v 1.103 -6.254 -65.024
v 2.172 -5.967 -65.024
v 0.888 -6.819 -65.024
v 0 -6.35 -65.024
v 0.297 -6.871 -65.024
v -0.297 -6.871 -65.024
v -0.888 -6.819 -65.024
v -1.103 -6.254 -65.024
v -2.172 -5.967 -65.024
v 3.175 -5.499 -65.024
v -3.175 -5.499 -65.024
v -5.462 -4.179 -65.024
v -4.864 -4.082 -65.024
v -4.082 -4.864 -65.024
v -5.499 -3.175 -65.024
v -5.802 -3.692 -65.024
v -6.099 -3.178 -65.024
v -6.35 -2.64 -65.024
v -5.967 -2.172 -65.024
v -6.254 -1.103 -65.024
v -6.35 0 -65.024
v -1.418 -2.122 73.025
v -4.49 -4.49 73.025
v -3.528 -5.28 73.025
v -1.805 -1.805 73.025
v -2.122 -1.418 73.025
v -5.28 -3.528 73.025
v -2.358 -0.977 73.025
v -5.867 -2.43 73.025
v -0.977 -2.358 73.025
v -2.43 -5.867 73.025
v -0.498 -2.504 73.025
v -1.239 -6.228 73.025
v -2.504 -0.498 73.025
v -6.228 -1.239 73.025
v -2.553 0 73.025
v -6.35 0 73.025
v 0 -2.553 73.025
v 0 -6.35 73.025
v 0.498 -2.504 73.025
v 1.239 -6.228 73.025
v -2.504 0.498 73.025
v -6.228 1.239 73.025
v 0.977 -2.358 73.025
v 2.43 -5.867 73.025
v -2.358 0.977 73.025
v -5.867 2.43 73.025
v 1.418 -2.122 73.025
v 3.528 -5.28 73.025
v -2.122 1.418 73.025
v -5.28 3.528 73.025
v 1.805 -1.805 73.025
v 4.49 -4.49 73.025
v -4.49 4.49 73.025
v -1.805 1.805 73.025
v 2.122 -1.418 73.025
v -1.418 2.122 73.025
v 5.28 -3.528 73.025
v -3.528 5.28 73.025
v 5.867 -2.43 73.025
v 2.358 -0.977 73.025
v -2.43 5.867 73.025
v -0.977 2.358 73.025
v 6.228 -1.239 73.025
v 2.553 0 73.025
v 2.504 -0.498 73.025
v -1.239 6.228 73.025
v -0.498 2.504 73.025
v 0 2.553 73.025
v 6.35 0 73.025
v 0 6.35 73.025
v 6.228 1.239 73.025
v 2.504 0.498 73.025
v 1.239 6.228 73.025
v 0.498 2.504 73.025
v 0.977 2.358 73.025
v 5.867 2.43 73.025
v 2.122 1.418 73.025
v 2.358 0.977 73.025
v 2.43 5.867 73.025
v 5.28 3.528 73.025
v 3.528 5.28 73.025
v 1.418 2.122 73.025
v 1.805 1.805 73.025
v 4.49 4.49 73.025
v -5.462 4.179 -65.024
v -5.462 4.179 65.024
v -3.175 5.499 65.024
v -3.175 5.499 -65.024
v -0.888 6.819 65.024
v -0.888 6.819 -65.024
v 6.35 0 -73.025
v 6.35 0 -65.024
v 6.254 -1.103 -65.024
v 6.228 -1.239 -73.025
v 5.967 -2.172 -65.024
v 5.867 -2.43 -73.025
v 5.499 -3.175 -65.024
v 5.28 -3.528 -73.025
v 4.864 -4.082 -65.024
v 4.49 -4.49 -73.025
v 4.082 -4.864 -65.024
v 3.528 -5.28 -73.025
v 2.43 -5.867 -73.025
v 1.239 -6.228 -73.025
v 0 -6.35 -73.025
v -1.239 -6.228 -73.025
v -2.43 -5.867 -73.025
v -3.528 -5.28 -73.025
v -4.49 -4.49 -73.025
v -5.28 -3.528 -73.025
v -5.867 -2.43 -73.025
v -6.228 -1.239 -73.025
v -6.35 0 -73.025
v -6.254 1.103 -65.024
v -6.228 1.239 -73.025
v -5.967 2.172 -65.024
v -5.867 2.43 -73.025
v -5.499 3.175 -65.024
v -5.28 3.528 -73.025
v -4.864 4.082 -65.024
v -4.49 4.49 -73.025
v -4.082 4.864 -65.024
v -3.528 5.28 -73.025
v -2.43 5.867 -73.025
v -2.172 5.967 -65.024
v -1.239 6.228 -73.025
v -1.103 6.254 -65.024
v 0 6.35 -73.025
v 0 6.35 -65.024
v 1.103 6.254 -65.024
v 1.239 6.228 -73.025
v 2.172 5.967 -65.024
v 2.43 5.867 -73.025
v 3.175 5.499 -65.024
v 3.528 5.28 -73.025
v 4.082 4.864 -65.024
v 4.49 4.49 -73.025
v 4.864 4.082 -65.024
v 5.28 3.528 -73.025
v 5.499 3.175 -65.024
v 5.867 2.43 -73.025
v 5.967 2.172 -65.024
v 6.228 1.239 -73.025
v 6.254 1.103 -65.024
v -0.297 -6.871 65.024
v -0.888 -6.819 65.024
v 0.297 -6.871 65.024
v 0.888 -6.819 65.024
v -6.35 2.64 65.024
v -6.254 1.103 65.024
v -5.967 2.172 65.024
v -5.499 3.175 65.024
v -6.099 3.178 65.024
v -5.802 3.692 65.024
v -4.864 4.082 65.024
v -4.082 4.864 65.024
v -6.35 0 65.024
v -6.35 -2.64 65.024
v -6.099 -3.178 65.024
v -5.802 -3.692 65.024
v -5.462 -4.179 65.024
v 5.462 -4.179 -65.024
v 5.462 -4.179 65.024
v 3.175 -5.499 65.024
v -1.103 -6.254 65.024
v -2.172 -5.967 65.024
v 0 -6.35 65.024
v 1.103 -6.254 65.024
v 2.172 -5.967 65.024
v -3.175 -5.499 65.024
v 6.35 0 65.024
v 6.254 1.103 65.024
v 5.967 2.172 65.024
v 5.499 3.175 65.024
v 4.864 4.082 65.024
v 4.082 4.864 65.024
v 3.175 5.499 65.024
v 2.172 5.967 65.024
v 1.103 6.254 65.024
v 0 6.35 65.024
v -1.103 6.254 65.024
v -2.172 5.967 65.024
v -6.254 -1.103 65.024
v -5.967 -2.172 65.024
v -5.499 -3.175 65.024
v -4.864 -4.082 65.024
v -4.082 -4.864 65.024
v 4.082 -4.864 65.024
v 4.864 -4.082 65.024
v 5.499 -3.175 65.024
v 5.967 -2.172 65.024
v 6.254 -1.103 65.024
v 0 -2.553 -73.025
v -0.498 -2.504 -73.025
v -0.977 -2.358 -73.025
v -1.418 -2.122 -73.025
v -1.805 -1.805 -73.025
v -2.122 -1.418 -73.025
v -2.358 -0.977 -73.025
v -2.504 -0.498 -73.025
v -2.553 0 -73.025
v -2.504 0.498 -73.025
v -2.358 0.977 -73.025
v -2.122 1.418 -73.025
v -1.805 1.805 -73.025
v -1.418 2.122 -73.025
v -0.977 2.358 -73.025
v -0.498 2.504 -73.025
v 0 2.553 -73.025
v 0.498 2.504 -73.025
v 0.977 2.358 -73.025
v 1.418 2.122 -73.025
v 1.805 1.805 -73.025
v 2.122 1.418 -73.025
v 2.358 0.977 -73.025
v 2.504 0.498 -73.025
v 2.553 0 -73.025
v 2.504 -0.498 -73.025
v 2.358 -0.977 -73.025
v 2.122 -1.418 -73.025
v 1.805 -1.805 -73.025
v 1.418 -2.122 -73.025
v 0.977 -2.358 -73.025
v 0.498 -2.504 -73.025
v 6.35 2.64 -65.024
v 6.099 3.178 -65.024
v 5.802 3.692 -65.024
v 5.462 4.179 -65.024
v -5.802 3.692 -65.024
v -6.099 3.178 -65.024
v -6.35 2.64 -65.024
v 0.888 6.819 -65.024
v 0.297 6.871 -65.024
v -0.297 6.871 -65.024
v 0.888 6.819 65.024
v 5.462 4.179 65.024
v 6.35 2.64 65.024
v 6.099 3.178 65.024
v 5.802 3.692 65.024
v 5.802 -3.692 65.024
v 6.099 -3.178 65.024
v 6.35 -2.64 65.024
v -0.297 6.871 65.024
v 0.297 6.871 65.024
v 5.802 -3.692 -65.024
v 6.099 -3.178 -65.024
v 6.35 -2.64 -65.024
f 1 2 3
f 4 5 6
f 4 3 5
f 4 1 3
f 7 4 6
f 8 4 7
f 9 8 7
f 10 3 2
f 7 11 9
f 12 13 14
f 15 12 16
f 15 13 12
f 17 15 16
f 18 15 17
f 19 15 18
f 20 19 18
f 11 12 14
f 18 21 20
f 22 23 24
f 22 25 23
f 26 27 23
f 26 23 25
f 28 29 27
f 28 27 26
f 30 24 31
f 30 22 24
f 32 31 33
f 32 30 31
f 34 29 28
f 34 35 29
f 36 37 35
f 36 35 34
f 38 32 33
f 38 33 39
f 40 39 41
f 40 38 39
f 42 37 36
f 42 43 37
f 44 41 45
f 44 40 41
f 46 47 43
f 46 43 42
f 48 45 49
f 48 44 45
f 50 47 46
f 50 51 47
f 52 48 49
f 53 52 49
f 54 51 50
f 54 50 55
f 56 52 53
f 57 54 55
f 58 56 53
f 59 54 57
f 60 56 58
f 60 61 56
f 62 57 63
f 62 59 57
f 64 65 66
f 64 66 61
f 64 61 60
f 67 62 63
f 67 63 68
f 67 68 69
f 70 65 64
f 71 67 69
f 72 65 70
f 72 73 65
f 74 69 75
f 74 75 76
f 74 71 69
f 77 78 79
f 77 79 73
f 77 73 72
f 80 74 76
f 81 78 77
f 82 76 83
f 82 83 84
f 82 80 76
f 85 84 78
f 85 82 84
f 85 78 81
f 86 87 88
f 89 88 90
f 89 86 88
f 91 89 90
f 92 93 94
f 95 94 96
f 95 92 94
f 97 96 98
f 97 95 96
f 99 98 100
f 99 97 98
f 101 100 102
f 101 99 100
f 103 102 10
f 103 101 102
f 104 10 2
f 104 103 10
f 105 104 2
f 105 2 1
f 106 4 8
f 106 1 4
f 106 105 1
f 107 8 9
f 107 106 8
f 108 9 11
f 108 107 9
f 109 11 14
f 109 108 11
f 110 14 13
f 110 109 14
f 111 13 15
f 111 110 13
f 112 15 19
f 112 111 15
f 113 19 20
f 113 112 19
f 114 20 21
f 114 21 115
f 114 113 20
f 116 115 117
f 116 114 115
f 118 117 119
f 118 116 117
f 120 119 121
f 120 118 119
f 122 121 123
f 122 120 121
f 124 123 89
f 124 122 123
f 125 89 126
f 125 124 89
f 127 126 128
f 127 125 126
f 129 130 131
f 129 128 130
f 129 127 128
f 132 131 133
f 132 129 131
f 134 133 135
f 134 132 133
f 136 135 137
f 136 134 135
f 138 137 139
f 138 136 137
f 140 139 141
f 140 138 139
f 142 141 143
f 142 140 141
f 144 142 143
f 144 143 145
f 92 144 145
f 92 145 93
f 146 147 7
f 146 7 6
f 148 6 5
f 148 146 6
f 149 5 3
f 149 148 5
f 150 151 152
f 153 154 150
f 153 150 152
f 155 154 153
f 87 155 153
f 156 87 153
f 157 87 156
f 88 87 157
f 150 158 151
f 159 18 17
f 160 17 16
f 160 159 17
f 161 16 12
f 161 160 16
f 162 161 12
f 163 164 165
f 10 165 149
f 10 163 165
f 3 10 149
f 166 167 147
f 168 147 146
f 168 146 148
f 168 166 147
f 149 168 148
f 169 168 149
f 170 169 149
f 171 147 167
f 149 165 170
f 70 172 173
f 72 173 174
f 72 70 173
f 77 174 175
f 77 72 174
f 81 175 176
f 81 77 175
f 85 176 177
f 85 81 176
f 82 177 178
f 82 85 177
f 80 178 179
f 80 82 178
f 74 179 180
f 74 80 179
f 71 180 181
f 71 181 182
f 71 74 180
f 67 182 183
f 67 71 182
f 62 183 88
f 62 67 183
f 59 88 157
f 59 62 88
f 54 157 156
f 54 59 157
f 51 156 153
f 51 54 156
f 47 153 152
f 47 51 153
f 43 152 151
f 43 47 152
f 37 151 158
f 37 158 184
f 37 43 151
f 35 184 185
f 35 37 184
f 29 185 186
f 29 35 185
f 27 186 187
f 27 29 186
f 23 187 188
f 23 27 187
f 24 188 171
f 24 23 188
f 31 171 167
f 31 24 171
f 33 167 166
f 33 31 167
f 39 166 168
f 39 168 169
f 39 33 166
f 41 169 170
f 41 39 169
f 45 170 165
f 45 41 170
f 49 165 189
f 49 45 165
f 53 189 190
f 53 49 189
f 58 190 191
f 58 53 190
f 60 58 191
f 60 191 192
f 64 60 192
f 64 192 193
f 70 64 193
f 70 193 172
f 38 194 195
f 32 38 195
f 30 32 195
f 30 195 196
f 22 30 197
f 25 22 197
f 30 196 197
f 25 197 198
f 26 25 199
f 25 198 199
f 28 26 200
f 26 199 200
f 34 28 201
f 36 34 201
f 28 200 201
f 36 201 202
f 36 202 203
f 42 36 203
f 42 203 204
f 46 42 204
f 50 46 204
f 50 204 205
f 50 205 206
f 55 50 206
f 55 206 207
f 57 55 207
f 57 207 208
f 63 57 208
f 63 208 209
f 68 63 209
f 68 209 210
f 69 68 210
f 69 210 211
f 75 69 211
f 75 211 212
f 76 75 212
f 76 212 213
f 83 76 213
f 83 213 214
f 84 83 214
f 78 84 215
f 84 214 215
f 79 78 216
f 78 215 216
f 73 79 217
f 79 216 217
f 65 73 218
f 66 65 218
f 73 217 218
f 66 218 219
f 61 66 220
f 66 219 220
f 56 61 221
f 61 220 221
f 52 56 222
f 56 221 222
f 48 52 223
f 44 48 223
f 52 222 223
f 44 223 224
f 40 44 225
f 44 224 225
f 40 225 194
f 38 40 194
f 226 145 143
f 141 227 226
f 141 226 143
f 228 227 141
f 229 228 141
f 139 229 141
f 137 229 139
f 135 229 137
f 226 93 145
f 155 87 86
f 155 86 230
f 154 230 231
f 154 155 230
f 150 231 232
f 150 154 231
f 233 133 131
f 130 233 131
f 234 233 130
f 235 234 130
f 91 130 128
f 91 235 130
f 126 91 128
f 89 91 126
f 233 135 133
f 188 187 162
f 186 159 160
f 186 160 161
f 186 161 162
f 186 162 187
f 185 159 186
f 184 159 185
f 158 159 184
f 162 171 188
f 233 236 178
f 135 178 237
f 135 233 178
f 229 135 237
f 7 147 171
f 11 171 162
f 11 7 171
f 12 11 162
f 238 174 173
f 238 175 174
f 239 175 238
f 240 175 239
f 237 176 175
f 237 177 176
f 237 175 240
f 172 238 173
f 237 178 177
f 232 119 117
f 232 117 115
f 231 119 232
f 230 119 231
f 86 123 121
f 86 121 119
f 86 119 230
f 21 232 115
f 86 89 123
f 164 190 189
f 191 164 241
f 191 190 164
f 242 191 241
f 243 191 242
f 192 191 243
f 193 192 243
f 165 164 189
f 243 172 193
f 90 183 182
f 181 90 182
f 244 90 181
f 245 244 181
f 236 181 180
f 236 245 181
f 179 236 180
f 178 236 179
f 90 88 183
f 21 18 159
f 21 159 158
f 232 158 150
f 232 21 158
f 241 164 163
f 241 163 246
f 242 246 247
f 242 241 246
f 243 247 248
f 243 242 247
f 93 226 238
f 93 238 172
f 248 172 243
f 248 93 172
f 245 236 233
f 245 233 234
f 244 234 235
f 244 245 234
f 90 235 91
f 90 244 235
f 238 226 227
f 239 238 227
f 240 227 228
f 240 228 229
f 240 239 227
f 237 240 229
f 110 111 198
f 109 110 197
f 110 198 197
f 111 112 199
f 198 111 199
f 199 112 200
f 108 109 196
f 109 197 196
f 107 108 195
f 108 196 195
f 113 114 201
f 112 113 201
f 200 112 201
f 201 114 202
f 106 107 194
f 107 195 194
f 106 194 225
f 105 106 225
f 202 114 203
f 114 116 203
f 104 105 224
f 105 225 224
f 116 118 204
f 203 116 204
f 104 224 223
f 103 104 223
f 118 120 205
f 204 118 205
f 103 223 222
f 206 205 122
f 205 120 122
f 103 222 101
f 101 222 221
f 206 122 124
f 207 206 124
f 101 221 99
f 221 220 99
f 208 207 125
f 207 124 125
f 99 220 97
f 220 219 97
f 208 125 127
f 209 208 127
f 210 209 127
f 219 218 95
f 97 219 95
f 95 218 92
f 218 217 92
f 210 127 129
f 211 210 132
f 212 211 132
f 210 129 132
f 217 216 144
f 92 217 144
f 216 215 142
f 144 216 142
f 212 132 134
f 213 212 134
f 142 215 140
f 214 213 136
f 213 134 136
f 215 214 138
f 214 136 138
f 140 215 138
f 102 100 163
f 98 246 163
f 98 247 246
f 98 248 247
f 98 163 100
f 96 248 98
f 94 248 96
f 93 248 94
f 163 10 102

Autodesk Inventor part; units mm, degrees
ref_plane "YZ Plane" through (0, 0, 0) normal (1, 0, 0) x (0, 1, 0)
ref_plane "XZ Plane" through (0, 0, 0) normal (0, 1, 0) x (-1, 0, 0)
ref_plane "XY Plane" through (0, 0, 0) normal (0, 0, 1) x (1, 0, 0)
sketch "Sketch1" plane through (0, 0, 0) normal (0, 0, 1) x (1, 0, 0)
  line L0 (-6.35, -3.6662) -> (-6.35, 3.6662)
  line L1 (-6.35, 3.6662) -> (0, 7.3323)
  line L2 (0, 7.3323) -> (6.35, 3.6662)
  line L3 (6.35, 3.6662) -> (6.35, -3.6662)
  line L4 (6.35, -3.6662) -> (0, -7.3323)
  line L5 (0, -7.3323) -> (-6.35, -3.6662)
  point P0 (0, 0)
  point P1 (0, 0)
  dimension "Size" = 12.7
extrude "Extrusion1" add sketch "Sketch1" along normal mid plane 146.05
sketch "Sketch3" plane through (0, 0, 73.025) normal (0, 0, 1) x (1, 0, 0)
  line L0 (-6.35, 3.6662) -> (0, 7.3323) construction
  line L1 (0, 7.3323) -> (6.35, 3.6662) construction
  line L2 (6.35, 3.6662) -> (6.35, -3.6662) construction
  line L3 (6.35, -3.6662) -> (0, -7.3323) construction
  line L4 (0, -7.3323) -> (-6.35, -3.6662) construction
  line L5 (-6.35, -3.6662) -> (-6.35, 3.6662) construction
  point P0 (0, 0)
hole "Hole1" at (0, 0, 73.025) direction (0, 0, -1) diameter 5.1054 end through all
sketch "Sketch4" plane through (0, 0, 73.025) normal (0, 0, 1) x (1, 0, 0)
  circle A0 centre (0, 0) radius 2.5527 construction
  line L0 (-6.35, 3.6662) -> (0, 7.3323) construction
  line L1 (0, 7.3323) -> (6.35, 3.6662) construction
  line L2 (6.35, 3.6662) -> (6.35, -3.6662) construction
  line L3 (6.35, -3.6662) -> (0, -7.3323) construction
  line L4 (0, -7.3323) -> (-6.35, -3.6662) construction
  line L5 (-6.35, -3.6662) -> (-6.35, 3.6662) construction
  circle A1 centre (0, 0) radius 6.8771
  circle A2 centre (0, 0) radius 8.89
  dimension "thunder" = 13.7541
  dimension "d16" = 17.78
extrude "Extrusion3" cut sketch "Sketch4" against normal through all
sketch "Sketch5" plane through (0, 0, 73.025) normal (0, 0, 1) x (1, 0, 0)
  arc A0 (5.4616, -4.1791) -> (6.35, -2.6403) centre (0, 0) ccw projected
  line L0 (5.4616, -4.1791) -> (0.8884, -6.8194) projected
  arc A1 (-0.8884, -6.8194) -> (0.8884, -6.8194) centre (0, 0) ccw projected
  line L1 (-0.8884, -6.8194) -> (-5.4616, -4.1791) projected
  arc A2 (-6.35, -2.6403) -> (-5.4616, -4.1791) centre (0, 0) ccw projected
  line L2 (-6.35, -2.6403) -> (-6.35, 2.6403) projected
  arc A3 (-5.4616, 4.1791) -> (-6.35, 2.6403) centre (0, 0) ccw projected
  line L3 (-5.4616, 4.1791) -> (-0.8884, 6.8194) projected
  arc A4 (0.8884, 6.8194) -> (-0.8884, 6.8194) centre (0, 0) ccw projected
  line L4 (0.8884, 6.8194) -> (5.4616, 4.1791) projected
  arc A5 (6.35, 2.6403) -> (5.4616, 4.1791) centre (0, 0) ccw projected
  line L5 (6.35, 2.6403) -> (6.35, -2.6403) projected
  circle A6 centre (0, 0) radius 2.5527 projected
  circle A7 centre (0, 0) radius 6.35
  point P0 (-3.175, 5.4993)
  point P1 (3.175, 5.4993)
  point P2 (6.35, 0)
  point P3 (-6.35, 0)
  point P4 (-3.175, -5.4993)
  point P5 (3.175, -5.4993)
  dimension "d19" = 12.7
extrude "Extrusion4" cut sketch "Sketch5" against normal blind 8.001 contours L0 A7 L5 A0 | L0 A1 L1 A7 | A7 L4 A5 L5 | L1 A2 L2 A7 | A7 L3 A4 L4 | L2 A3 L3 A7
mirror "Mirror2" about plane through (0, 0, 0) normal (0, 0, 1) of "Extrusion4"
equation "\"bearing\" = 25.4"
properties part number "CL4-019" material "Aluminum 6061"
